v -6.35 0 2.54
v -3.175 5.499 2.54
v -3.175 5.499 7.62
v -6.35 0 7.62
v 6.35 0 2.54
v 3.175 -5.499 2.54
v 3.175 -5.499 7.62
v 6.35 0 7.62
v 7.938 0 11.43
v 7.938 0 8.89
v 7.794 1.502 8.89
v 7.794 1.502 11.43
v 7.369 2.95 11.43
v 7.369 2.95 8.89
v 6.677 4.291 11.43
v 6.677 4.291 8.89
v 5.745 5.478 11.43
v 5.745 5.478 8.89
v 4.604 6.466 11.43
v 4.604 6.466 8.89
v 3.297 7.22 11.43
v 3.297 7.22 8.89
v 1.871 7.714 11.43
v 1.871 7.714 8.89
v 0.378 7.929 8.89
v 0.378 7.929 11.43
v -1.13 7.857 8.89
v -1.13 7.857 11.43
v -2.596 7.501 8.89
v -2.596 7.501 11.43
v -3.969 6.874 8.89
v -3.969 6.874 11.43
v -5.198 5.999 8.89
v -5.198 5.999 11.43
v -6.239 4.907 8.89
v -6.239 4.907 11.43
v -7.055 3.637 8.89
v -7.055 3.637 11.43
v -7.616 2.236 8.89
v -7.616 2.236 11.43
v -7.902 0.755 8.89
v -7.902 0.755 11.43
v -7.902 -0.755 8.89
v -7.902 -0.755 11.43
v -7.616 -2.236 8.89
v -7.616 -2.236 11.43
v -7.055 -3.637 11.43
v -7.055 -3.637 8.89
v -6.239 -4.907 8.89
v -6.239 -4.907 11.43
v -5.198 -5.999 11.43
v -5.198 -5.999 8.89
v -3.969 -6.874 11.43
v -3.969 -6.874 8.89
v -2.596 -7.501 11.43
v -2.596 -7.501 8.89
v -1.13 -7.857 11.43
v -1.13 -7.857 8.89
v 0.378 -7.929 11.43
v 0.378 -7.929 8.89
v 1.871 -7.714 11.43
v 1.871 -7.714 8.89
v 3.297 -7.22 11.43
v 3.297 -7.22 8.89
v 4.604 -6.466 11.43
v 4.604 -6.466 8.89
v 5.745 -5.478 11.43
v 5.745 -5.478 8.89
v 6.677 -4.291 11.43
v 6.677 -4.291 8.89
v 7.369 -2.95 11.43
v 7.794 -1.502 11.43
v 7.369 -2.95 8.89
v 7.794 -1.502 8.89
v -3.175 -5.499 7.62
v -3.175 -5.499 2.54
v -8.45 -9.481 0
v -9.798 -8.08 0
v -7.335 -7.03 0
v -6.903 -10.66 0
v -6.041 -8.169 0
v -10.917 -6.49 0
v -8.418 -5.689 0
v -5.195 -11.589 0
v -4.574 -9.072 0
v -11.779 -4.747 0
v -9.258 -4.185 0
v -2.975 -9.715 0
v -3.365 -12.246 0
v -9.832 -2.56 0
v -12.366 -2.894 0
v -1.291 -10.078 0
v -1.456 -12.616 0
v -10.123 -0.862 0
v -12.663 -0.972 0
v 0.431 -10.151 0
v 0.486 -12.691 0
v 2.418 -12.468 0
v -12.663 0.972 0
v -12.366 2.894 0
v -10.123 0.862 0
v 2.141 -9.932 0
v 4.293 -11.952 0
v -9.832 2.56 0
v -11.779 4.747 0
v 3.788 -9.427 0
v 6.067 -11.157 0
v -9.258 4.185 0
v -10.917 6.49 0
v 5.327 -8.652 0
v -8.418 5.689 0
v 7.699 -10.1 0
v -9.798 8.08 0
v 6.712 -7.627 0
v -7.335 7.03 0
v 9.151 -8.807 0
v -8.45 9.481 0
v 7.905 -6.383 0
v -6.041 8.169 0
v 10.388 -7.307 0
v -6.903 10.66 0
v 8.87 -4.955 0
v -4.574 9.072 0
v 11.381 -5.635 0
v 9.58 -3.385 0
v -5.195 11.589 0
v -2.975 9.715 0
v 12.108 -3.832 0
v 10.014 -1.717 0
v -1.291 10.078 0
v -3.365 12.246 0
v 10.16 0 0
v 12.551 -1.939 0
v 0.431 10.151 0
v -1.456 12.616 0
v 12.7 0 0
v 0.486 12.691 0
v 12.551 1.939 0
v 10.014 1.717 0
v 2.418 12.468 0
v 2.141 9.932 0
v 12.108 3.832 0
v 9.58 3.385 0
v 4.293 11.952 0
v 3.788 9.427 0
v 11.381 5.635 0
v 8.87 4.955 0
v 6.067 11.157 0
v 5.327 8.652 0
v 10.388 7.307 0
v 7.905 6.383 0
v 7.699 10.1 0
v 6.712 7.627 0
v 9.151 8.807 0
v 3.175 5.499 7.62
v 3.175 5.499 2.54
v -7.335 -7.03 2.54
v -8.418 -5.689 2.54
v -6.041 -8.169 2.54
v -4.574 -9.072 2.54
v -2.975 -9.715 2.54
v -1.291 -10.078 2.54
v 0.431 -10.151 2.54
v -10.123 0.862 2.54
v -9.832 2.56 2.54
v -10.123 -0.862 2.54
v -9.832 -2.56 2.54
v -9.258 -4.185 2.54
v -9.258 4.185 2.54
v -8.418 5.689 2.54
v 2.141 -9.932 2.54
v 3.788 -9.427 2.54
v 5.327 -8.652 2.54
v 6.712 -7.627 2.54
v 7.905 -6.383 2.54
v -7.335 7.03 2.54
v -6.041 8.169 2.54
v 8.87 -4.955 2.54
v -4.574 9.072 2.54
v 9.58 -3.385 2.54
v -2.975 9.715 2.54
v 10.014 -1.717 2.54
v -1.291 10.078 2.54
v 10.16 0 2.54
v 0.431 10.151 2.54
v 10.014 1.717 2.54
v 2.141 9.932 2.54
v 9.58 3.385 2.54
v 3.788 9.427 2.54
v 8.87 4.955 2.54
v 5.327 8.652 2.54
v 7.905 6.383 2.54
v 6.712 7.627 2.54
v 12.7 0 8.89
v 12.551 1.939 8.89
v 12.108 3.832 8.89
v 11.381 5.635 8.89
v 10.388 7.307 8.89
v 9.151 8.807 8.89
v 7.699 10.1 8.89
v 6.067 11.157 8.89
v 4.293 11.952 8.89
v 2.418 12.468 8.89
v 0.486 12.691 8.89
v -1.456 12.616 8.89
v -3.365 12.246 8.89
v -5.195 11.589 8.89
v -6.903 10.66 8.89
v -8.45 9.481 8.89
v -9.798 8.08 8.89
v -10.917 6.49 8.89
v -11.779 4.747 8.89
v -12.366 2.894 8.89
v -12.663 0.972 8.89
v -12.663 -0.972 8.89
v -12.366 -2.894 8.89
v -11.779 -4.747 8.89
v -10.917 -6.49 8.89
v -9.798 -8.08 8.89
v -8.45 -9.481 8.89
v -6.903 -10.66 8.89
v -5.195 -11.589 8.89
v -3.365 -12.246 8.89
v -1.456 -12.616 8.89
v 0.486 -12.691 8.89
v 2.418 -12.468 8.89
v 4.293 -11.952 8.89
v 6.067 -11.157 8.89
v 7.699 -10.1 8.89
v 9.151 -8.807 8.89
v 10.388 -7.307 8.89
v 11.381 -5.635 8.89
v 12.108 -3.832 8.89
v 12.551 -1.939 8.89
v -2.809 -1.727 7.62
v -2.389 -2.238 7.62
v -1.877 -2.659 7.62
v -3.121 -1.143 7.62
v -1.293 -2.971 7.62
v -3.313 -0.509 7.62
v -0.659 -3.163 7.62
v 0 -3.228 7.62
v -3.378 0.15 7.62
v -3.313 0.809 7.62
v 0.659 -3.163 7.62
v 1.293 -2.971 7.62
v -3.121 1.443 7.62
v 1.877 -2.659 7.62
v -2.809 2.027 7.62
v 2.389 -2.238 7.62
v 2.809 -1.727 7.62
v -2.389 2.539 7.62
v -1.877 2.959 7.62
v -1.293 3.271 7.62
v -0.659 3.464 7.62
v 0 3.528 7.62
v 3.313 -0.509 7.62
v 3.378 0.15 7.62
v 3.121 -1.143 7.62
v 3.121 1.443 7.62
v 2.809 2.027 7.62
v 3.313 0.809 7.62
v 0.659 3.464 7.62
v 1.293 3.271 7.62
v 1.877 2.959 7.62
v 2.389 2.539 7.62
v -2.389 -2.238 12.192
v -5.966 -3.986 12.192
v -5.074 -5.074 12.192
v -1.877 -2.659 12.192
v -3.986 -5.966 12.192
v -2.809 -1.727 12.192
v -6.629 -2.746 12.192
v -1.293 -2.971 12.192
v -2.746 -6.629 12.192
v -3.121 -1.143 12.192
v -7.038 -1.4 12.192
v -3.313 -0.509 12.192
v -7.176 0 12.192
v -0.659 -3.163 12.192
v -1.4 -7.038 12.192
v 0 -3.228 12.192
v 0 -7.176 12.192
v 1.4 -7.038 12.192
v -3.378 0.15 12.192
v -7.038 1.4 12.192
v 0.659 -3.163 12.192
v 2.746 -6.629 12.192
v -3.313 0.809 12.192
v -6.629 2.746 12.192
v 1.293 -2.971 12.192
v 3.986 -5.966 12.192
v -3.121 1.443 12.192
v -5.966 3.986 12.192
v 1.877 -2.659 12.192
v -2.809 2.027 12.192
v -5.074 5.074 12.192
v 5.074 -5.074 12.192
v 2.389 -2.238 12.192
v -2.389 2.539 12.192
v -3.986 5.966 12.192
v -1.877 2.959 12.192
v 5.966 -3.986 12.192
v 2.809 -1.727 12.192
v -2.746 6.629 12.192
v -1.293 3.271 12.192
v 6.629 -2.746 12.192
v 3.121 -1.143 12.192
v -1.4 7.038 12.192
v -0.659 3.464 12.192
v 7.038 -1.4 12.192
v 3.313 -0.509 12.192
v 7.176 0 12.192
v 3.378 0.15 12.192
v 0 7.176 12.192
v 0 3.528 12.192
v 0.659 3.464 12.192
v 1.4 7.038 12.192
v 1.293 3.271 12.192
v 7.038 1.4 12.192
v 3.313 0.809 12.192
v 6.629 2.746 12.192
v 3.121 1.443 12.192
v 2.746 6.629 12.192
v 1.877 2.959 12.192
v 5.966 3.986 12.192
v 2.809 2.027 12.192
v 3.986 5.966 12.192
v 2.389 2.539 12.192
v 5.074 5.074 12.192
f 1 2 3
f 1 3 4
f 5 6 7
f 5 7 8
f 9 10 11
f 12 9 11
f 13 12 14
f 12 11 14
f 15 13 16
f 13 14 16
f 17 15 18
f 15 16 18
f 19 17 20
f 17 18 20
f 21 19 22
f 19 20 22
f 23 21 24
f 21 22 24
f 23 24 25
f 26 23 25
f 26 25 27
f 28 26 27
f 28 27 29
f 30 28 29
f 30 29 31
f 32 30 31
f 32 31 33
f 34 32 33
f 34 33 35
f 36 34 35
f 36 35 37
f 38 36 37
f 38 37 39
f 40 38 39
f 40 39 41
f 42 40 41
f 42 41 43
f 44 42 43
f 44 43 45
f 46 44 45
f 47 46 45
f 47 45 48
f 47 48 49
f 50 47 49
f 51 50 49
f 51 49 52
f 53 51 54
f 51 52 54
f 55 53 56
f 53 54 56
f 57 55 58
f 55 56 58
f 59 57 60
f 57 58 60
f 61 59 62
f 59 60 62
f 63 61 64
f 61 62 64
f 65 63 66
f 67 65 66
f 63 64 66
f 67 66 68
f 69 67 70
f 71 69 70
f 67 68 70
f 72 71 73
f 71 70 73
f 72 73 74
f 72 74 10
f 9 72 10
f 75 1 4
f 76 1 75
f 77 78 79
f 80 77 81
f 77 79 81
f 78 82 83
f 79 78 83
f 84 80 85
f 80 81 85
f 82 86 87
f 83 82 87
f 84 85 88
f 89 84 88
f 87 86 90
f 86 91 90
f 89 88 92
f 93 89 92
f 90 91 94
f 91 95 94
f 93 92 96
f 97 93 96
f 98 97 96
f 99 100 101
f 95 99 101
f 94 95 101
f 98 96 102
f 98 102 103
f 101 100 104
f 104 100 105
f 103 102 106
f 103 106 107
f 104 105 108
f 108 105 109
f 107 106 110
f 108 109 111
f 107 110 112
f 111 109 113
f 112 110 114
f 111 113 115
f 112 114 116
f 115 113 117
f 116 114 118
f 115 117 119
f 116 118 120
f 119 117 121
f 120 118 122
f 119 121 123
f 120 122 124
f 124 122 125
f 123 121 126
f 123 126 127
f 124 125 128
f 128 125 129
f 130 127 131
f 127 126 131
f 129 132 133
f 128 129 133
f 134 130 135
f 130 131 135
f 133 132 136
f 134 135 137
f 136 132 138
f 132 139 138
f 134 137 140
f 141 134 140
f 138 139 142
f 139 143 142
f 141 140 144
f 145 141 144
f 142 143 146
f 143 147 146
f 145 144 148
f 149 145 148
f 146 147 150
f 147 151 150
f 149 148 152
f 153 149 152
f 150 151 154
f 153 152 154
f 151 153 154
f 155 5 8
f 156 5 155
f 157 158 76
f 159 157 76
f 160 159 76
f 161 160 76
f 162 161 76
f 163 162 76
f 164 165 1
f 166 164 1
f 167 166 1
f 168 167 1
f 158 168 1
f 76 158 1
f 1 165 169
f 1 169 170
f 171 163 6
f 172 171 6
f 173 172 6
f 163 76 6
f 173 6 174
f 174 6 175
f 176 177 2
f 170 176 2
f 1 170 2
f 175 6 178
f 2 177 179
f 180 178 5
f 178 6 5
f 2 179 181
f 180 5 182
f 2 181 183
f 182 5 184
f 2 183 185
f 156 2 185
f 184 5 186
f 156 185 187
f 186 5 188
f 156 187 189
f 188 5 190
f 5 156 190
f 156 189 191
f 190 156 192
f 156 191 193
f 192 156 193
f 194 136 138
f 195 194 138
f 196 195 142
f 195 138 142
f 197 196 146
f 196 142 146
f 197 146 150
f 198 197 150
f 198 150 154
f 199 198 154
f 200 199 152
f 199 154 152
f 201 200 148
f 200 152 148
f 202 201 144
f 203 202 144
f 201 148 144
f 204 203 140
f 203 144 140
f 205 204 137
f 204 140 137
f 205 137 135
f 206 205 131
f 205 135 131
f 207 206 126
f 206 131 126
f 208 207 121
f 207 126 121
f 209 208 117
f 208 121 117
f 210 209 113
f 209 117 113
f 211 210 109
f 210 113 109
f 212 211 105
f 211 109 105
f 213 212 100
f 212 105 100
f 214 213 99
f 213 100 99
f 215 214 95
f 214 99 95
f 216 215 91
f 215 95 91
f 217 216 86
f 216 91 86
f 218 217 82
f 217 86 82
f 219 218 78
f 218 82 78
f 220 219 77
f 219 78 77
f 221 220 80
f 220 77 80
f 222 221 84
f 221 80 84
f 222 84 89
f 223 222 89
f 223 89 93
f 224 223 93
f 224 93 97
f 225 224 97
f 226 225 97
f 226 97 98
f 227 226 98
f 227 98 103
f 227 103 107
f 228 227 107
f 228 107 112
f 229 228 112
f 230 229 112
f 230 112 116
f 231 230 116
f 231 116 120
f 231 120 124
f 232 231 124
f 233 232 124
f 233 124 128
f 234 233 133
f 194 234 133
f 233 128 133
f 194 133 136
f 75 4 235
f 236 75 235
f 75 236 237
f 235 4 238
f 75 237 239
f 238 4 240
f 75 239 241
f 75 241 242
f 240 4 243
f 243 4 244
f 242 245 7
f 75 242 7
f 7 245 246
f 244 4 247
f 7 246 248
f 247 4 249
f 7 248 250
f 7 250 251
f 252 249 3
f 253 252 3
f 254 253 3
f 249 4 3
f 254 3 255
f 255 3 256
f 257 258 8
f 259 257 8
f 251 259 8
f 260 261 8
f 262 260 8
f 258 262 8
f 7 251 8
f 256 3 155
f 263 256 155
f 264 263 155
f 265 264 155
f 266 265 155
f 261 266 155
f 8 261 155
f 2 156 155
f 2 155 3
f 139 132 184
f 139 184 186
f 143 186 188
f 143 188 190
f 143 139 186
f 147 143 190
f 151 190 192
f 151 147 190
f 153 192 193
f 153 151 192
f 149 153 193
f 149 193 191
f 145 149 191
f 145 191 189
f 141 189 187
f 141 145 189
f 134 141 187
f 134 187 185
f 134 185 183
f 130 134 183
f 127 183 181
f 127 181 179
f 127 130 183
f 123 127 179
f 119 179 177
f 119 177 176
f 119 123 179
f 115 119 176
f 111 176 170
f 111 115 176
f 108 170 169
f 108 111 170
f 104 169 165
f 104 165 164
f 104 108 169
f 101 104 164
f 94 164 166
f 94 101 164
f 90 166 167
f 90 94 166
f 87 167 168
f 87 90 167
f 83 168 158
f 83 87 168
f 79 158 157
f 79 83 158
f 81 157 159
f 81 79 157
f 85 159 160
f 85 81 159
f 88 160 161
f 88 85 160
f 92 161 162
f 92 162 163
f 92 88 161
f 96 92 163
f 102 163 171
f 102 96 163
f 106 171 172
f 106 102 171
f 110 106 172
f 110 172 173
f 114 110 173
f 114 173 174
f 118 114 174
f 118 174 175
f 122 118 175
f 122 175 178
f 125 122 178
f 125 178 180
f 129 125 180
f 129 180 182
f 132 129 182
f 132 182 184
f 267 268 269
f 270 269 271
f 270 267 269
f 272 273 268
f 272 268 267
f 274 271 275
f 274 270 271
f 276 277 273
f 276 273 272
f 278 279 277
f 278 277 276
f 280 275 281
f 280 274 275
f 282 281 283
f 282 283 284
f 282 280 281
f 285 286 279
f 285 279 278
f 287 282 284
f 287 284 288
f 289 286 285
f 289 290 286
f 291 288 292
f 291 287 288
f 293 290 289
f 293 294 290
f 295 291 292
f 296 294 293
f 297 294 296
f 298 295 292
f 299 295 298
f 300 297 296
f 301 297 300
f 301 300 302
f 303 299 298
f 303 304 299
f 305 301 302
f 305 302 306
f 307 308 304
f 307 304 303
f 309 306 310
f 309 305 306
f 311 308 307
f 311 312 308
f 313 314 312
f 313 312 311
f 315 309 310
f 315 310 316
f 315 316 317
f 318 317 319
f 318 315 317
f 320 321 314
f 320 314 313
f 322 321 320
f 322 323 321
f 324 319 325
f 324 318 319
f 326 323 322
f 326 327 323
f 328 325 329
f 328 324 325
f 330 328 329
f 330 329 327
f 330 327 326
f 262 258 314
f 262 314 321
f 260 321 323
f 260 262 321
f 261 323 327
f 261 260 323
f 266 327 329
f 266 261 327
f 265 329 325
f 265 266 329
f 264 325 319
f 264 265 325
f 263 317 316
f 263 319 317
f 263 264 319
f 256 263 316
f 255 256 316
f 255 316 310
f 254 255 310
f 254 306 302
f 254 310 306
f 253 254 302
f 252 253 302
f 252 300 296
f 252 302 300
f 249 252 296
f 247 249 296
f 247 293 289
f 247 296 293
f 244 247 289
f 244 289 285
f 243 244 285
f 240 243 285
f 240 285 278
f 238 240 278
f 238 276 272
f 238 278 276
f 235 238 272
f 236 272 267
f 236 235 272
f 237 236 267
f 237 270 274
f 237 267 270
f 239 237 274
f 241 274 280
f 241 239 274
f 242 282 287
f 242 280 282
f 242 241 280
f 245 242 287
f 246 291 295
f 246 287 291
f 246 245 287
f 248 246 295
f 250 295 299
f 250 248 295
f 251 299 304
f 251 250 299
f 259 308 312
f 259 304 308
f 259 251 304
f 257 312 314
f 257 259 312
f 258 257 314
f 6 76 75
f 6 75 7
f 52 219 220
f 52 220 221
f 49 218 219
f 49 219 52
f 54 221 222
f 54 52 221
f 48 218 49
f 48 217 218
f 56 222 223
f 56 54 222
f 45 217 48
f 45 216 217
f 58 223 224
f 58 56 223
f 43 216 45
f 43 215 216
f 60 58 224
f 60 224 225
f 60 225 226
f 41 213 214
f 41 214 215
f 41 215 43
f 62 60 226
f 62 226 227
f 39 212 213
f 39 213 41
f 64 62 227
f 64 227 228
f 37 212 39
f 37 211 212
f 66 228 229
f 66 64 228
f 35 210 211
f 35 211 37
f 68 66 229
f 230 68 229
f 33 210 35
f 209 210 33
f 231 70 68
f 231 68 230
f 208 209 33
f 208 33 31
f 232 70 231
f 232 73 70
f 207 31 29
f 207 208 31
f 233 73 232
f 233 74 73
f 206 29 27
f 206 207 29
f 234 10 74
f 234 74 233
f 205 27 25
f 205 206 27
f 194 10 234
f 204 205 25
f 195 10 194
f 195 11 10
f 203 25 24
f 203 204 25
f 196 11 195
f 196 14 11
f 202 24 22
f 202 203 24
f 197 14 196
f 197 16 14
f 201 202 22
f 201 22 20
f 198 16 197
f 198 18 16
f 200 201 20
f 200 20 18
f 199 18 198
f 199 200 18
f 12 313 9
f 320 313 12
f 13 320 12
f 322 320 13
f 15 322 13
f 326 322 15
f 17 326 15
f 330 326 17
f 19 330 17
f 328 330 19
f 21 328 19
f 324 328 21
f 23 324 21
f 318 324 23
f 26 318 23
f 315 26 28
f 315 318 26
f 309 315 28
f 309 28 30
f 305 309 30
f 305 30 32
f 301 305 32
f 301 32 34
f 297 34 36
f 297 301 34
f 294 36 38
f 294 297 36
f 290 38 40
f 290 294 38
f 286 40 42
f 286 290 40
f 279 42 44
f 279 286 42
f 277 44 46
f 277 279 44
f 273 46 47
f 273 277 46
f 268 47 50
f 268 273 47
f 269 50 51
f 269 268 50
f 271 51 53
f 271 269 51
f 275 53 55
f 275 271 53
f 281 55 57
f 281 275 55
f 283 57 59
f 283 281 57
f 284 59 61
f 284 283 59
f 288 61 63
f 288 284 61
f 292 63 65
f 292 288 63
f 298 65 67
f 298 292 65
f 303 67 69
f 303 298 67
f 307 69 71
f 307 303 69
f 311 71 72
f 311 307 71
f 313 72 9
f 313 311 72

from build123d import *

# Parameters (mm, degrees)
F0_R     = 12.7
F0_R_2   = 10.16
F0_R_3   = 7.9375
F0_R_4   = 3.3782
F1_DEPTH = 8.89
F2_DEPTH = 12.192
F3_DEPTH = 25.4
F4_DEPTH = 2.54
F5_SIZE  = 0.762
F7_DEPTH = 7.62


with BuildPart() as f1:
    # F0 (on Top) → F1 (new body)
    with BuildSketch(Plane.XY):
        Circle(F0_R)
        Circle(F0_R_2, mode=Mode.SUBTRACT)
        Circle(F0_R_2)
        Circle(F0_R_3, mode=Mode.SUBTRACT)
        Circle(F0_R_3)
        with Locations((0, 0.150276348)):
            Circle(F0_R_4, mode=Mode.SUBTRACT)
        with Locations((0, 0.150276348)):
            Circle(F0_R_4)
    extrude(amount=F1_DEPTH)

    # F0 (on Top) → F2 (join)
    with BuildSketch(Plane.XY):
        Circle(F0_R_3)
        with Locations((0, 0.150276348)):
            Circle(F0_R_4, mode=Mode.SUBTRACT)
        with Locations((0, 0.150276348)):
            Circle(F0_R_4)
    extrude(amount=F2_DEPTH)

    # F0 (on Top) → F3 (cut)
    with BuildSketch(Plane.XY):
        with Locations((0, 0.150276348)):
            Circle(F0_R_4)
    extrude(amount=F3_DEPTH, mode=Mode.SUBTRACT)

    # F0 (on Top) → F4 (cut)
    with BuildSketch(Plane.XY):
        Circle(F0_R_2)
        Circle(F0_R_3, mode=Mode.SUBTRACT)
        Circle(F0_R_3)
        with Locations((0, 0.150276348)):
            Circle(F0_R_4, mode=Mode.SUBTRACT)
    extrude(amount=F4_DEPTH, mode=Mode.SUBTRACT)

    # F5
    f5_edges = [f1.edges().sort_by_distance(p)[0] for p in [
        (-7.9375, 0, 12.192),
    ]]
    chamfer(f5_edges, length=F5_SIZE)

    # F6 (on Top) → F7 (cut)
    with BuildSketch(Plane.XY):
        Polygon((3.1749068653, 5.4991), (-3.1749068653, 5.4991), (-6.3498137306, 0), (-3.1749068653, -5.4991), (3.1749068653, -5.4991), (6.3498137306, 0), align=None)
    extrude(amount=F7_DEPTH, mode=Mode.SUBTRACT)


solid = f1.part
